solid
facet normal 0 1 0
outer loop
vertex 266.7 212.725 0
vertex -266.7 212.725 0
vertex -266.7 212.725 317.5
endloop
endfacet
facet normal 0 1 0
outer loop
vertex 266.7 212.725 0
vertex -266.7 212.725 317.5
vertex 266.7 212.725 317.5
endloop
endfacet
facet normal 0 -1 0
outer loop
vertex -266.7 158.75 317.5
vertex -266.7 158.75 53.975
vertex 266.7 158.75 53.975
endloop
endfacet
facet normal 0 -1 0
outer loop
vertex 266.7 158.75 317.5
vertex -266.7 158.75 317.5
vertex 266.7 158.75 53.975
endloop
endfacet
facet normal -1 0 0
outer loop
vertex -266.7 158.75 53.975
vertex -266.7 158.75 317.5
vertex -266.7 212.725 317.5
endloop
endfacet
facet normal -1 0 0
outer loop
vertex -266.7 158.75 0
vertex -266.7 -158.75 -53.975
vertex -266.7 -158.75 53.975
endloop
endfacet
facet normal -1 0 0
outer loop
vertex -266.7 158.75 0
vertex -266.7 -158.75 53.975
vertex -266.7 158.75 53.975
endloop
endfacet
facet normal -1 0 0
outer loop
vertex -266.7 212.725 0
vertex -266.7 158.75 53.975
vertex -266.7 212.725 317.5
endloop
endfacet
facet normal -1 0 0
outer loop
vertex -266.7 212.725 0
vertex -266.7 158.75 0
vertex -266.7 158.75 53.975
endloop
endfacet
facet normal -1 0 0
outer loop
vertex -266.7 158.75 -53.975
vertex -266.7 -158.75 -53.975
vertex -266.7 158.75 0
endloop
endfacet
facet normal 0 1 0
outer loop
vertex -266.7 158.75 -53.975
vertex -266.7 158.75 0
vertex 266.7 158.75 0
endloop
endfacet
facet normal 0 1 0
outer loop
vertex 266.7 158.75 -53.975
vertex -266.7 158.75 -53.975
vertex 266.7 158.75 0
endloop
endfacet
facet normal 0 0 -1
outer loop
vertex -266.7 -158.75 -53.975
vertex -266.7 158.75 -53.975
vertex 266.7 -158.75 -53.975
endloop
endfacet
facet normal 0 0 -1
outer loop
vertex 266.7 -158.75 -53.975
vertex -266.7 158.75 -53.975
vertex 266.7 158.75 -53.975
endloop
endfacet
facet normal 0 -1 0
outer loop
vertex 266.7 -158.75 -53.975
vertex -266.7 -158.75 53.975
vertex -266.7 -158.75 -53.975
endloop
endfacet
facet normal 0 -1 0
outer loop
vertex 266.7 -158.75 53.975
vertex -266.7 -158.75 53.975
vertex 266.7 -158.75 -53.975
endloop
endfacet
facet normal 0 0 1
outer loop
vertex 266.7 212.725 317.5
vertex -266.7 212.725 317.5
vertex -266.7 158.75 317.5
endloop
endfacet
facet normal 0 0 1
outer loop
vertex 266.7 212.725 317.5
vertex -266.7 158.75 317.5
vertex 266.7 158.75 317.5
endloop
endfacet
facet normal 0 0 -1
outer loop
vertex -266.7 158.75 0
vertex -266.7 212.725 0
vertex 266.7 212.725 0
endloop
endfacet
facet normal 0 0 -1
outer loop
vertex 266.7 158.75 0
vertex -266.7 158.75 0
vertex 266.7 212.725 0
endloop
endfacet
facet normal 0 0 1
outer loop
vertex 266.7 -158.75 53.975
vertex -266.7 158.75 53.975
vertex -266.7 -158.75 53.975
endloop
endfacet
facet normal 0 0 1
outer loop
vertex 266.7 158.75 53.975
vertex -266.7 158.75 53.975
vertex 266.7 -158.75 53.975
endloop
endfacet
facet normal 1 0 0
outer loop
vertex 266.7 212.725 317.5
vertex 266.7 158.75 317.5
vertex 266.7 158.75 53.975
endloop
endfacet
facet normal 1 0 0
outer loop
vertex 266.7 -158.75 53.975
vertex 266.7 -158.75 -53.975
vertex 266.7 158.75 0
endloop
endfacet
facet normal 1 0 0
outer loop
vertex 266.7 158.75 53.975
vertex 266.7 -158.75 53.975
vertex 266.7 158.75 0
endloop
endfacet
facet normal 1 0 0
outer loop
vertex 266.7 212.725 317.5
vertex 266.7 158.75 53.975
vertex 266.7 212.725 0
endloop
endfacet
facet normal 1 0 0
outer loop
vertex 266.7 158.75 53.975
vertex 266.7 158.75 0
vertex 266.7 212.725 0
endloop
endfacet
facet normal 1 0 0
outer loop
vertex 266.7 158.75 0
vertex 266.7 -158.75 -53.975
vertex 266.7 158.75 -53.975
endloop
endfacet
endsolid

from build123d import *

# Parameters (mm, degrees)
F0_W     = 533.4
F0_H     = 317.5
F1_DEPTH = 53.975
F2_W     = 533.4
F2_H     = 53.975
F3_DEPTH = 317.5


with BuildPart() as f1:
    # F0 (on Top) → F1 (new body, symmetric)
    with BuildSketch(Plane.XY):
        Rectangle(F0_W, F0_H)
    extrude(amount=F1_DEPTH, both=True)

    # F2 (on Top) → F3 (join)
    with BuildSketch(Plane.XY):
        with Locations((0, 185.7375)):
            Rectangle(F2_W, F2_H)
    extrude(amount=F3_DEPTH)


solid = f1.part
